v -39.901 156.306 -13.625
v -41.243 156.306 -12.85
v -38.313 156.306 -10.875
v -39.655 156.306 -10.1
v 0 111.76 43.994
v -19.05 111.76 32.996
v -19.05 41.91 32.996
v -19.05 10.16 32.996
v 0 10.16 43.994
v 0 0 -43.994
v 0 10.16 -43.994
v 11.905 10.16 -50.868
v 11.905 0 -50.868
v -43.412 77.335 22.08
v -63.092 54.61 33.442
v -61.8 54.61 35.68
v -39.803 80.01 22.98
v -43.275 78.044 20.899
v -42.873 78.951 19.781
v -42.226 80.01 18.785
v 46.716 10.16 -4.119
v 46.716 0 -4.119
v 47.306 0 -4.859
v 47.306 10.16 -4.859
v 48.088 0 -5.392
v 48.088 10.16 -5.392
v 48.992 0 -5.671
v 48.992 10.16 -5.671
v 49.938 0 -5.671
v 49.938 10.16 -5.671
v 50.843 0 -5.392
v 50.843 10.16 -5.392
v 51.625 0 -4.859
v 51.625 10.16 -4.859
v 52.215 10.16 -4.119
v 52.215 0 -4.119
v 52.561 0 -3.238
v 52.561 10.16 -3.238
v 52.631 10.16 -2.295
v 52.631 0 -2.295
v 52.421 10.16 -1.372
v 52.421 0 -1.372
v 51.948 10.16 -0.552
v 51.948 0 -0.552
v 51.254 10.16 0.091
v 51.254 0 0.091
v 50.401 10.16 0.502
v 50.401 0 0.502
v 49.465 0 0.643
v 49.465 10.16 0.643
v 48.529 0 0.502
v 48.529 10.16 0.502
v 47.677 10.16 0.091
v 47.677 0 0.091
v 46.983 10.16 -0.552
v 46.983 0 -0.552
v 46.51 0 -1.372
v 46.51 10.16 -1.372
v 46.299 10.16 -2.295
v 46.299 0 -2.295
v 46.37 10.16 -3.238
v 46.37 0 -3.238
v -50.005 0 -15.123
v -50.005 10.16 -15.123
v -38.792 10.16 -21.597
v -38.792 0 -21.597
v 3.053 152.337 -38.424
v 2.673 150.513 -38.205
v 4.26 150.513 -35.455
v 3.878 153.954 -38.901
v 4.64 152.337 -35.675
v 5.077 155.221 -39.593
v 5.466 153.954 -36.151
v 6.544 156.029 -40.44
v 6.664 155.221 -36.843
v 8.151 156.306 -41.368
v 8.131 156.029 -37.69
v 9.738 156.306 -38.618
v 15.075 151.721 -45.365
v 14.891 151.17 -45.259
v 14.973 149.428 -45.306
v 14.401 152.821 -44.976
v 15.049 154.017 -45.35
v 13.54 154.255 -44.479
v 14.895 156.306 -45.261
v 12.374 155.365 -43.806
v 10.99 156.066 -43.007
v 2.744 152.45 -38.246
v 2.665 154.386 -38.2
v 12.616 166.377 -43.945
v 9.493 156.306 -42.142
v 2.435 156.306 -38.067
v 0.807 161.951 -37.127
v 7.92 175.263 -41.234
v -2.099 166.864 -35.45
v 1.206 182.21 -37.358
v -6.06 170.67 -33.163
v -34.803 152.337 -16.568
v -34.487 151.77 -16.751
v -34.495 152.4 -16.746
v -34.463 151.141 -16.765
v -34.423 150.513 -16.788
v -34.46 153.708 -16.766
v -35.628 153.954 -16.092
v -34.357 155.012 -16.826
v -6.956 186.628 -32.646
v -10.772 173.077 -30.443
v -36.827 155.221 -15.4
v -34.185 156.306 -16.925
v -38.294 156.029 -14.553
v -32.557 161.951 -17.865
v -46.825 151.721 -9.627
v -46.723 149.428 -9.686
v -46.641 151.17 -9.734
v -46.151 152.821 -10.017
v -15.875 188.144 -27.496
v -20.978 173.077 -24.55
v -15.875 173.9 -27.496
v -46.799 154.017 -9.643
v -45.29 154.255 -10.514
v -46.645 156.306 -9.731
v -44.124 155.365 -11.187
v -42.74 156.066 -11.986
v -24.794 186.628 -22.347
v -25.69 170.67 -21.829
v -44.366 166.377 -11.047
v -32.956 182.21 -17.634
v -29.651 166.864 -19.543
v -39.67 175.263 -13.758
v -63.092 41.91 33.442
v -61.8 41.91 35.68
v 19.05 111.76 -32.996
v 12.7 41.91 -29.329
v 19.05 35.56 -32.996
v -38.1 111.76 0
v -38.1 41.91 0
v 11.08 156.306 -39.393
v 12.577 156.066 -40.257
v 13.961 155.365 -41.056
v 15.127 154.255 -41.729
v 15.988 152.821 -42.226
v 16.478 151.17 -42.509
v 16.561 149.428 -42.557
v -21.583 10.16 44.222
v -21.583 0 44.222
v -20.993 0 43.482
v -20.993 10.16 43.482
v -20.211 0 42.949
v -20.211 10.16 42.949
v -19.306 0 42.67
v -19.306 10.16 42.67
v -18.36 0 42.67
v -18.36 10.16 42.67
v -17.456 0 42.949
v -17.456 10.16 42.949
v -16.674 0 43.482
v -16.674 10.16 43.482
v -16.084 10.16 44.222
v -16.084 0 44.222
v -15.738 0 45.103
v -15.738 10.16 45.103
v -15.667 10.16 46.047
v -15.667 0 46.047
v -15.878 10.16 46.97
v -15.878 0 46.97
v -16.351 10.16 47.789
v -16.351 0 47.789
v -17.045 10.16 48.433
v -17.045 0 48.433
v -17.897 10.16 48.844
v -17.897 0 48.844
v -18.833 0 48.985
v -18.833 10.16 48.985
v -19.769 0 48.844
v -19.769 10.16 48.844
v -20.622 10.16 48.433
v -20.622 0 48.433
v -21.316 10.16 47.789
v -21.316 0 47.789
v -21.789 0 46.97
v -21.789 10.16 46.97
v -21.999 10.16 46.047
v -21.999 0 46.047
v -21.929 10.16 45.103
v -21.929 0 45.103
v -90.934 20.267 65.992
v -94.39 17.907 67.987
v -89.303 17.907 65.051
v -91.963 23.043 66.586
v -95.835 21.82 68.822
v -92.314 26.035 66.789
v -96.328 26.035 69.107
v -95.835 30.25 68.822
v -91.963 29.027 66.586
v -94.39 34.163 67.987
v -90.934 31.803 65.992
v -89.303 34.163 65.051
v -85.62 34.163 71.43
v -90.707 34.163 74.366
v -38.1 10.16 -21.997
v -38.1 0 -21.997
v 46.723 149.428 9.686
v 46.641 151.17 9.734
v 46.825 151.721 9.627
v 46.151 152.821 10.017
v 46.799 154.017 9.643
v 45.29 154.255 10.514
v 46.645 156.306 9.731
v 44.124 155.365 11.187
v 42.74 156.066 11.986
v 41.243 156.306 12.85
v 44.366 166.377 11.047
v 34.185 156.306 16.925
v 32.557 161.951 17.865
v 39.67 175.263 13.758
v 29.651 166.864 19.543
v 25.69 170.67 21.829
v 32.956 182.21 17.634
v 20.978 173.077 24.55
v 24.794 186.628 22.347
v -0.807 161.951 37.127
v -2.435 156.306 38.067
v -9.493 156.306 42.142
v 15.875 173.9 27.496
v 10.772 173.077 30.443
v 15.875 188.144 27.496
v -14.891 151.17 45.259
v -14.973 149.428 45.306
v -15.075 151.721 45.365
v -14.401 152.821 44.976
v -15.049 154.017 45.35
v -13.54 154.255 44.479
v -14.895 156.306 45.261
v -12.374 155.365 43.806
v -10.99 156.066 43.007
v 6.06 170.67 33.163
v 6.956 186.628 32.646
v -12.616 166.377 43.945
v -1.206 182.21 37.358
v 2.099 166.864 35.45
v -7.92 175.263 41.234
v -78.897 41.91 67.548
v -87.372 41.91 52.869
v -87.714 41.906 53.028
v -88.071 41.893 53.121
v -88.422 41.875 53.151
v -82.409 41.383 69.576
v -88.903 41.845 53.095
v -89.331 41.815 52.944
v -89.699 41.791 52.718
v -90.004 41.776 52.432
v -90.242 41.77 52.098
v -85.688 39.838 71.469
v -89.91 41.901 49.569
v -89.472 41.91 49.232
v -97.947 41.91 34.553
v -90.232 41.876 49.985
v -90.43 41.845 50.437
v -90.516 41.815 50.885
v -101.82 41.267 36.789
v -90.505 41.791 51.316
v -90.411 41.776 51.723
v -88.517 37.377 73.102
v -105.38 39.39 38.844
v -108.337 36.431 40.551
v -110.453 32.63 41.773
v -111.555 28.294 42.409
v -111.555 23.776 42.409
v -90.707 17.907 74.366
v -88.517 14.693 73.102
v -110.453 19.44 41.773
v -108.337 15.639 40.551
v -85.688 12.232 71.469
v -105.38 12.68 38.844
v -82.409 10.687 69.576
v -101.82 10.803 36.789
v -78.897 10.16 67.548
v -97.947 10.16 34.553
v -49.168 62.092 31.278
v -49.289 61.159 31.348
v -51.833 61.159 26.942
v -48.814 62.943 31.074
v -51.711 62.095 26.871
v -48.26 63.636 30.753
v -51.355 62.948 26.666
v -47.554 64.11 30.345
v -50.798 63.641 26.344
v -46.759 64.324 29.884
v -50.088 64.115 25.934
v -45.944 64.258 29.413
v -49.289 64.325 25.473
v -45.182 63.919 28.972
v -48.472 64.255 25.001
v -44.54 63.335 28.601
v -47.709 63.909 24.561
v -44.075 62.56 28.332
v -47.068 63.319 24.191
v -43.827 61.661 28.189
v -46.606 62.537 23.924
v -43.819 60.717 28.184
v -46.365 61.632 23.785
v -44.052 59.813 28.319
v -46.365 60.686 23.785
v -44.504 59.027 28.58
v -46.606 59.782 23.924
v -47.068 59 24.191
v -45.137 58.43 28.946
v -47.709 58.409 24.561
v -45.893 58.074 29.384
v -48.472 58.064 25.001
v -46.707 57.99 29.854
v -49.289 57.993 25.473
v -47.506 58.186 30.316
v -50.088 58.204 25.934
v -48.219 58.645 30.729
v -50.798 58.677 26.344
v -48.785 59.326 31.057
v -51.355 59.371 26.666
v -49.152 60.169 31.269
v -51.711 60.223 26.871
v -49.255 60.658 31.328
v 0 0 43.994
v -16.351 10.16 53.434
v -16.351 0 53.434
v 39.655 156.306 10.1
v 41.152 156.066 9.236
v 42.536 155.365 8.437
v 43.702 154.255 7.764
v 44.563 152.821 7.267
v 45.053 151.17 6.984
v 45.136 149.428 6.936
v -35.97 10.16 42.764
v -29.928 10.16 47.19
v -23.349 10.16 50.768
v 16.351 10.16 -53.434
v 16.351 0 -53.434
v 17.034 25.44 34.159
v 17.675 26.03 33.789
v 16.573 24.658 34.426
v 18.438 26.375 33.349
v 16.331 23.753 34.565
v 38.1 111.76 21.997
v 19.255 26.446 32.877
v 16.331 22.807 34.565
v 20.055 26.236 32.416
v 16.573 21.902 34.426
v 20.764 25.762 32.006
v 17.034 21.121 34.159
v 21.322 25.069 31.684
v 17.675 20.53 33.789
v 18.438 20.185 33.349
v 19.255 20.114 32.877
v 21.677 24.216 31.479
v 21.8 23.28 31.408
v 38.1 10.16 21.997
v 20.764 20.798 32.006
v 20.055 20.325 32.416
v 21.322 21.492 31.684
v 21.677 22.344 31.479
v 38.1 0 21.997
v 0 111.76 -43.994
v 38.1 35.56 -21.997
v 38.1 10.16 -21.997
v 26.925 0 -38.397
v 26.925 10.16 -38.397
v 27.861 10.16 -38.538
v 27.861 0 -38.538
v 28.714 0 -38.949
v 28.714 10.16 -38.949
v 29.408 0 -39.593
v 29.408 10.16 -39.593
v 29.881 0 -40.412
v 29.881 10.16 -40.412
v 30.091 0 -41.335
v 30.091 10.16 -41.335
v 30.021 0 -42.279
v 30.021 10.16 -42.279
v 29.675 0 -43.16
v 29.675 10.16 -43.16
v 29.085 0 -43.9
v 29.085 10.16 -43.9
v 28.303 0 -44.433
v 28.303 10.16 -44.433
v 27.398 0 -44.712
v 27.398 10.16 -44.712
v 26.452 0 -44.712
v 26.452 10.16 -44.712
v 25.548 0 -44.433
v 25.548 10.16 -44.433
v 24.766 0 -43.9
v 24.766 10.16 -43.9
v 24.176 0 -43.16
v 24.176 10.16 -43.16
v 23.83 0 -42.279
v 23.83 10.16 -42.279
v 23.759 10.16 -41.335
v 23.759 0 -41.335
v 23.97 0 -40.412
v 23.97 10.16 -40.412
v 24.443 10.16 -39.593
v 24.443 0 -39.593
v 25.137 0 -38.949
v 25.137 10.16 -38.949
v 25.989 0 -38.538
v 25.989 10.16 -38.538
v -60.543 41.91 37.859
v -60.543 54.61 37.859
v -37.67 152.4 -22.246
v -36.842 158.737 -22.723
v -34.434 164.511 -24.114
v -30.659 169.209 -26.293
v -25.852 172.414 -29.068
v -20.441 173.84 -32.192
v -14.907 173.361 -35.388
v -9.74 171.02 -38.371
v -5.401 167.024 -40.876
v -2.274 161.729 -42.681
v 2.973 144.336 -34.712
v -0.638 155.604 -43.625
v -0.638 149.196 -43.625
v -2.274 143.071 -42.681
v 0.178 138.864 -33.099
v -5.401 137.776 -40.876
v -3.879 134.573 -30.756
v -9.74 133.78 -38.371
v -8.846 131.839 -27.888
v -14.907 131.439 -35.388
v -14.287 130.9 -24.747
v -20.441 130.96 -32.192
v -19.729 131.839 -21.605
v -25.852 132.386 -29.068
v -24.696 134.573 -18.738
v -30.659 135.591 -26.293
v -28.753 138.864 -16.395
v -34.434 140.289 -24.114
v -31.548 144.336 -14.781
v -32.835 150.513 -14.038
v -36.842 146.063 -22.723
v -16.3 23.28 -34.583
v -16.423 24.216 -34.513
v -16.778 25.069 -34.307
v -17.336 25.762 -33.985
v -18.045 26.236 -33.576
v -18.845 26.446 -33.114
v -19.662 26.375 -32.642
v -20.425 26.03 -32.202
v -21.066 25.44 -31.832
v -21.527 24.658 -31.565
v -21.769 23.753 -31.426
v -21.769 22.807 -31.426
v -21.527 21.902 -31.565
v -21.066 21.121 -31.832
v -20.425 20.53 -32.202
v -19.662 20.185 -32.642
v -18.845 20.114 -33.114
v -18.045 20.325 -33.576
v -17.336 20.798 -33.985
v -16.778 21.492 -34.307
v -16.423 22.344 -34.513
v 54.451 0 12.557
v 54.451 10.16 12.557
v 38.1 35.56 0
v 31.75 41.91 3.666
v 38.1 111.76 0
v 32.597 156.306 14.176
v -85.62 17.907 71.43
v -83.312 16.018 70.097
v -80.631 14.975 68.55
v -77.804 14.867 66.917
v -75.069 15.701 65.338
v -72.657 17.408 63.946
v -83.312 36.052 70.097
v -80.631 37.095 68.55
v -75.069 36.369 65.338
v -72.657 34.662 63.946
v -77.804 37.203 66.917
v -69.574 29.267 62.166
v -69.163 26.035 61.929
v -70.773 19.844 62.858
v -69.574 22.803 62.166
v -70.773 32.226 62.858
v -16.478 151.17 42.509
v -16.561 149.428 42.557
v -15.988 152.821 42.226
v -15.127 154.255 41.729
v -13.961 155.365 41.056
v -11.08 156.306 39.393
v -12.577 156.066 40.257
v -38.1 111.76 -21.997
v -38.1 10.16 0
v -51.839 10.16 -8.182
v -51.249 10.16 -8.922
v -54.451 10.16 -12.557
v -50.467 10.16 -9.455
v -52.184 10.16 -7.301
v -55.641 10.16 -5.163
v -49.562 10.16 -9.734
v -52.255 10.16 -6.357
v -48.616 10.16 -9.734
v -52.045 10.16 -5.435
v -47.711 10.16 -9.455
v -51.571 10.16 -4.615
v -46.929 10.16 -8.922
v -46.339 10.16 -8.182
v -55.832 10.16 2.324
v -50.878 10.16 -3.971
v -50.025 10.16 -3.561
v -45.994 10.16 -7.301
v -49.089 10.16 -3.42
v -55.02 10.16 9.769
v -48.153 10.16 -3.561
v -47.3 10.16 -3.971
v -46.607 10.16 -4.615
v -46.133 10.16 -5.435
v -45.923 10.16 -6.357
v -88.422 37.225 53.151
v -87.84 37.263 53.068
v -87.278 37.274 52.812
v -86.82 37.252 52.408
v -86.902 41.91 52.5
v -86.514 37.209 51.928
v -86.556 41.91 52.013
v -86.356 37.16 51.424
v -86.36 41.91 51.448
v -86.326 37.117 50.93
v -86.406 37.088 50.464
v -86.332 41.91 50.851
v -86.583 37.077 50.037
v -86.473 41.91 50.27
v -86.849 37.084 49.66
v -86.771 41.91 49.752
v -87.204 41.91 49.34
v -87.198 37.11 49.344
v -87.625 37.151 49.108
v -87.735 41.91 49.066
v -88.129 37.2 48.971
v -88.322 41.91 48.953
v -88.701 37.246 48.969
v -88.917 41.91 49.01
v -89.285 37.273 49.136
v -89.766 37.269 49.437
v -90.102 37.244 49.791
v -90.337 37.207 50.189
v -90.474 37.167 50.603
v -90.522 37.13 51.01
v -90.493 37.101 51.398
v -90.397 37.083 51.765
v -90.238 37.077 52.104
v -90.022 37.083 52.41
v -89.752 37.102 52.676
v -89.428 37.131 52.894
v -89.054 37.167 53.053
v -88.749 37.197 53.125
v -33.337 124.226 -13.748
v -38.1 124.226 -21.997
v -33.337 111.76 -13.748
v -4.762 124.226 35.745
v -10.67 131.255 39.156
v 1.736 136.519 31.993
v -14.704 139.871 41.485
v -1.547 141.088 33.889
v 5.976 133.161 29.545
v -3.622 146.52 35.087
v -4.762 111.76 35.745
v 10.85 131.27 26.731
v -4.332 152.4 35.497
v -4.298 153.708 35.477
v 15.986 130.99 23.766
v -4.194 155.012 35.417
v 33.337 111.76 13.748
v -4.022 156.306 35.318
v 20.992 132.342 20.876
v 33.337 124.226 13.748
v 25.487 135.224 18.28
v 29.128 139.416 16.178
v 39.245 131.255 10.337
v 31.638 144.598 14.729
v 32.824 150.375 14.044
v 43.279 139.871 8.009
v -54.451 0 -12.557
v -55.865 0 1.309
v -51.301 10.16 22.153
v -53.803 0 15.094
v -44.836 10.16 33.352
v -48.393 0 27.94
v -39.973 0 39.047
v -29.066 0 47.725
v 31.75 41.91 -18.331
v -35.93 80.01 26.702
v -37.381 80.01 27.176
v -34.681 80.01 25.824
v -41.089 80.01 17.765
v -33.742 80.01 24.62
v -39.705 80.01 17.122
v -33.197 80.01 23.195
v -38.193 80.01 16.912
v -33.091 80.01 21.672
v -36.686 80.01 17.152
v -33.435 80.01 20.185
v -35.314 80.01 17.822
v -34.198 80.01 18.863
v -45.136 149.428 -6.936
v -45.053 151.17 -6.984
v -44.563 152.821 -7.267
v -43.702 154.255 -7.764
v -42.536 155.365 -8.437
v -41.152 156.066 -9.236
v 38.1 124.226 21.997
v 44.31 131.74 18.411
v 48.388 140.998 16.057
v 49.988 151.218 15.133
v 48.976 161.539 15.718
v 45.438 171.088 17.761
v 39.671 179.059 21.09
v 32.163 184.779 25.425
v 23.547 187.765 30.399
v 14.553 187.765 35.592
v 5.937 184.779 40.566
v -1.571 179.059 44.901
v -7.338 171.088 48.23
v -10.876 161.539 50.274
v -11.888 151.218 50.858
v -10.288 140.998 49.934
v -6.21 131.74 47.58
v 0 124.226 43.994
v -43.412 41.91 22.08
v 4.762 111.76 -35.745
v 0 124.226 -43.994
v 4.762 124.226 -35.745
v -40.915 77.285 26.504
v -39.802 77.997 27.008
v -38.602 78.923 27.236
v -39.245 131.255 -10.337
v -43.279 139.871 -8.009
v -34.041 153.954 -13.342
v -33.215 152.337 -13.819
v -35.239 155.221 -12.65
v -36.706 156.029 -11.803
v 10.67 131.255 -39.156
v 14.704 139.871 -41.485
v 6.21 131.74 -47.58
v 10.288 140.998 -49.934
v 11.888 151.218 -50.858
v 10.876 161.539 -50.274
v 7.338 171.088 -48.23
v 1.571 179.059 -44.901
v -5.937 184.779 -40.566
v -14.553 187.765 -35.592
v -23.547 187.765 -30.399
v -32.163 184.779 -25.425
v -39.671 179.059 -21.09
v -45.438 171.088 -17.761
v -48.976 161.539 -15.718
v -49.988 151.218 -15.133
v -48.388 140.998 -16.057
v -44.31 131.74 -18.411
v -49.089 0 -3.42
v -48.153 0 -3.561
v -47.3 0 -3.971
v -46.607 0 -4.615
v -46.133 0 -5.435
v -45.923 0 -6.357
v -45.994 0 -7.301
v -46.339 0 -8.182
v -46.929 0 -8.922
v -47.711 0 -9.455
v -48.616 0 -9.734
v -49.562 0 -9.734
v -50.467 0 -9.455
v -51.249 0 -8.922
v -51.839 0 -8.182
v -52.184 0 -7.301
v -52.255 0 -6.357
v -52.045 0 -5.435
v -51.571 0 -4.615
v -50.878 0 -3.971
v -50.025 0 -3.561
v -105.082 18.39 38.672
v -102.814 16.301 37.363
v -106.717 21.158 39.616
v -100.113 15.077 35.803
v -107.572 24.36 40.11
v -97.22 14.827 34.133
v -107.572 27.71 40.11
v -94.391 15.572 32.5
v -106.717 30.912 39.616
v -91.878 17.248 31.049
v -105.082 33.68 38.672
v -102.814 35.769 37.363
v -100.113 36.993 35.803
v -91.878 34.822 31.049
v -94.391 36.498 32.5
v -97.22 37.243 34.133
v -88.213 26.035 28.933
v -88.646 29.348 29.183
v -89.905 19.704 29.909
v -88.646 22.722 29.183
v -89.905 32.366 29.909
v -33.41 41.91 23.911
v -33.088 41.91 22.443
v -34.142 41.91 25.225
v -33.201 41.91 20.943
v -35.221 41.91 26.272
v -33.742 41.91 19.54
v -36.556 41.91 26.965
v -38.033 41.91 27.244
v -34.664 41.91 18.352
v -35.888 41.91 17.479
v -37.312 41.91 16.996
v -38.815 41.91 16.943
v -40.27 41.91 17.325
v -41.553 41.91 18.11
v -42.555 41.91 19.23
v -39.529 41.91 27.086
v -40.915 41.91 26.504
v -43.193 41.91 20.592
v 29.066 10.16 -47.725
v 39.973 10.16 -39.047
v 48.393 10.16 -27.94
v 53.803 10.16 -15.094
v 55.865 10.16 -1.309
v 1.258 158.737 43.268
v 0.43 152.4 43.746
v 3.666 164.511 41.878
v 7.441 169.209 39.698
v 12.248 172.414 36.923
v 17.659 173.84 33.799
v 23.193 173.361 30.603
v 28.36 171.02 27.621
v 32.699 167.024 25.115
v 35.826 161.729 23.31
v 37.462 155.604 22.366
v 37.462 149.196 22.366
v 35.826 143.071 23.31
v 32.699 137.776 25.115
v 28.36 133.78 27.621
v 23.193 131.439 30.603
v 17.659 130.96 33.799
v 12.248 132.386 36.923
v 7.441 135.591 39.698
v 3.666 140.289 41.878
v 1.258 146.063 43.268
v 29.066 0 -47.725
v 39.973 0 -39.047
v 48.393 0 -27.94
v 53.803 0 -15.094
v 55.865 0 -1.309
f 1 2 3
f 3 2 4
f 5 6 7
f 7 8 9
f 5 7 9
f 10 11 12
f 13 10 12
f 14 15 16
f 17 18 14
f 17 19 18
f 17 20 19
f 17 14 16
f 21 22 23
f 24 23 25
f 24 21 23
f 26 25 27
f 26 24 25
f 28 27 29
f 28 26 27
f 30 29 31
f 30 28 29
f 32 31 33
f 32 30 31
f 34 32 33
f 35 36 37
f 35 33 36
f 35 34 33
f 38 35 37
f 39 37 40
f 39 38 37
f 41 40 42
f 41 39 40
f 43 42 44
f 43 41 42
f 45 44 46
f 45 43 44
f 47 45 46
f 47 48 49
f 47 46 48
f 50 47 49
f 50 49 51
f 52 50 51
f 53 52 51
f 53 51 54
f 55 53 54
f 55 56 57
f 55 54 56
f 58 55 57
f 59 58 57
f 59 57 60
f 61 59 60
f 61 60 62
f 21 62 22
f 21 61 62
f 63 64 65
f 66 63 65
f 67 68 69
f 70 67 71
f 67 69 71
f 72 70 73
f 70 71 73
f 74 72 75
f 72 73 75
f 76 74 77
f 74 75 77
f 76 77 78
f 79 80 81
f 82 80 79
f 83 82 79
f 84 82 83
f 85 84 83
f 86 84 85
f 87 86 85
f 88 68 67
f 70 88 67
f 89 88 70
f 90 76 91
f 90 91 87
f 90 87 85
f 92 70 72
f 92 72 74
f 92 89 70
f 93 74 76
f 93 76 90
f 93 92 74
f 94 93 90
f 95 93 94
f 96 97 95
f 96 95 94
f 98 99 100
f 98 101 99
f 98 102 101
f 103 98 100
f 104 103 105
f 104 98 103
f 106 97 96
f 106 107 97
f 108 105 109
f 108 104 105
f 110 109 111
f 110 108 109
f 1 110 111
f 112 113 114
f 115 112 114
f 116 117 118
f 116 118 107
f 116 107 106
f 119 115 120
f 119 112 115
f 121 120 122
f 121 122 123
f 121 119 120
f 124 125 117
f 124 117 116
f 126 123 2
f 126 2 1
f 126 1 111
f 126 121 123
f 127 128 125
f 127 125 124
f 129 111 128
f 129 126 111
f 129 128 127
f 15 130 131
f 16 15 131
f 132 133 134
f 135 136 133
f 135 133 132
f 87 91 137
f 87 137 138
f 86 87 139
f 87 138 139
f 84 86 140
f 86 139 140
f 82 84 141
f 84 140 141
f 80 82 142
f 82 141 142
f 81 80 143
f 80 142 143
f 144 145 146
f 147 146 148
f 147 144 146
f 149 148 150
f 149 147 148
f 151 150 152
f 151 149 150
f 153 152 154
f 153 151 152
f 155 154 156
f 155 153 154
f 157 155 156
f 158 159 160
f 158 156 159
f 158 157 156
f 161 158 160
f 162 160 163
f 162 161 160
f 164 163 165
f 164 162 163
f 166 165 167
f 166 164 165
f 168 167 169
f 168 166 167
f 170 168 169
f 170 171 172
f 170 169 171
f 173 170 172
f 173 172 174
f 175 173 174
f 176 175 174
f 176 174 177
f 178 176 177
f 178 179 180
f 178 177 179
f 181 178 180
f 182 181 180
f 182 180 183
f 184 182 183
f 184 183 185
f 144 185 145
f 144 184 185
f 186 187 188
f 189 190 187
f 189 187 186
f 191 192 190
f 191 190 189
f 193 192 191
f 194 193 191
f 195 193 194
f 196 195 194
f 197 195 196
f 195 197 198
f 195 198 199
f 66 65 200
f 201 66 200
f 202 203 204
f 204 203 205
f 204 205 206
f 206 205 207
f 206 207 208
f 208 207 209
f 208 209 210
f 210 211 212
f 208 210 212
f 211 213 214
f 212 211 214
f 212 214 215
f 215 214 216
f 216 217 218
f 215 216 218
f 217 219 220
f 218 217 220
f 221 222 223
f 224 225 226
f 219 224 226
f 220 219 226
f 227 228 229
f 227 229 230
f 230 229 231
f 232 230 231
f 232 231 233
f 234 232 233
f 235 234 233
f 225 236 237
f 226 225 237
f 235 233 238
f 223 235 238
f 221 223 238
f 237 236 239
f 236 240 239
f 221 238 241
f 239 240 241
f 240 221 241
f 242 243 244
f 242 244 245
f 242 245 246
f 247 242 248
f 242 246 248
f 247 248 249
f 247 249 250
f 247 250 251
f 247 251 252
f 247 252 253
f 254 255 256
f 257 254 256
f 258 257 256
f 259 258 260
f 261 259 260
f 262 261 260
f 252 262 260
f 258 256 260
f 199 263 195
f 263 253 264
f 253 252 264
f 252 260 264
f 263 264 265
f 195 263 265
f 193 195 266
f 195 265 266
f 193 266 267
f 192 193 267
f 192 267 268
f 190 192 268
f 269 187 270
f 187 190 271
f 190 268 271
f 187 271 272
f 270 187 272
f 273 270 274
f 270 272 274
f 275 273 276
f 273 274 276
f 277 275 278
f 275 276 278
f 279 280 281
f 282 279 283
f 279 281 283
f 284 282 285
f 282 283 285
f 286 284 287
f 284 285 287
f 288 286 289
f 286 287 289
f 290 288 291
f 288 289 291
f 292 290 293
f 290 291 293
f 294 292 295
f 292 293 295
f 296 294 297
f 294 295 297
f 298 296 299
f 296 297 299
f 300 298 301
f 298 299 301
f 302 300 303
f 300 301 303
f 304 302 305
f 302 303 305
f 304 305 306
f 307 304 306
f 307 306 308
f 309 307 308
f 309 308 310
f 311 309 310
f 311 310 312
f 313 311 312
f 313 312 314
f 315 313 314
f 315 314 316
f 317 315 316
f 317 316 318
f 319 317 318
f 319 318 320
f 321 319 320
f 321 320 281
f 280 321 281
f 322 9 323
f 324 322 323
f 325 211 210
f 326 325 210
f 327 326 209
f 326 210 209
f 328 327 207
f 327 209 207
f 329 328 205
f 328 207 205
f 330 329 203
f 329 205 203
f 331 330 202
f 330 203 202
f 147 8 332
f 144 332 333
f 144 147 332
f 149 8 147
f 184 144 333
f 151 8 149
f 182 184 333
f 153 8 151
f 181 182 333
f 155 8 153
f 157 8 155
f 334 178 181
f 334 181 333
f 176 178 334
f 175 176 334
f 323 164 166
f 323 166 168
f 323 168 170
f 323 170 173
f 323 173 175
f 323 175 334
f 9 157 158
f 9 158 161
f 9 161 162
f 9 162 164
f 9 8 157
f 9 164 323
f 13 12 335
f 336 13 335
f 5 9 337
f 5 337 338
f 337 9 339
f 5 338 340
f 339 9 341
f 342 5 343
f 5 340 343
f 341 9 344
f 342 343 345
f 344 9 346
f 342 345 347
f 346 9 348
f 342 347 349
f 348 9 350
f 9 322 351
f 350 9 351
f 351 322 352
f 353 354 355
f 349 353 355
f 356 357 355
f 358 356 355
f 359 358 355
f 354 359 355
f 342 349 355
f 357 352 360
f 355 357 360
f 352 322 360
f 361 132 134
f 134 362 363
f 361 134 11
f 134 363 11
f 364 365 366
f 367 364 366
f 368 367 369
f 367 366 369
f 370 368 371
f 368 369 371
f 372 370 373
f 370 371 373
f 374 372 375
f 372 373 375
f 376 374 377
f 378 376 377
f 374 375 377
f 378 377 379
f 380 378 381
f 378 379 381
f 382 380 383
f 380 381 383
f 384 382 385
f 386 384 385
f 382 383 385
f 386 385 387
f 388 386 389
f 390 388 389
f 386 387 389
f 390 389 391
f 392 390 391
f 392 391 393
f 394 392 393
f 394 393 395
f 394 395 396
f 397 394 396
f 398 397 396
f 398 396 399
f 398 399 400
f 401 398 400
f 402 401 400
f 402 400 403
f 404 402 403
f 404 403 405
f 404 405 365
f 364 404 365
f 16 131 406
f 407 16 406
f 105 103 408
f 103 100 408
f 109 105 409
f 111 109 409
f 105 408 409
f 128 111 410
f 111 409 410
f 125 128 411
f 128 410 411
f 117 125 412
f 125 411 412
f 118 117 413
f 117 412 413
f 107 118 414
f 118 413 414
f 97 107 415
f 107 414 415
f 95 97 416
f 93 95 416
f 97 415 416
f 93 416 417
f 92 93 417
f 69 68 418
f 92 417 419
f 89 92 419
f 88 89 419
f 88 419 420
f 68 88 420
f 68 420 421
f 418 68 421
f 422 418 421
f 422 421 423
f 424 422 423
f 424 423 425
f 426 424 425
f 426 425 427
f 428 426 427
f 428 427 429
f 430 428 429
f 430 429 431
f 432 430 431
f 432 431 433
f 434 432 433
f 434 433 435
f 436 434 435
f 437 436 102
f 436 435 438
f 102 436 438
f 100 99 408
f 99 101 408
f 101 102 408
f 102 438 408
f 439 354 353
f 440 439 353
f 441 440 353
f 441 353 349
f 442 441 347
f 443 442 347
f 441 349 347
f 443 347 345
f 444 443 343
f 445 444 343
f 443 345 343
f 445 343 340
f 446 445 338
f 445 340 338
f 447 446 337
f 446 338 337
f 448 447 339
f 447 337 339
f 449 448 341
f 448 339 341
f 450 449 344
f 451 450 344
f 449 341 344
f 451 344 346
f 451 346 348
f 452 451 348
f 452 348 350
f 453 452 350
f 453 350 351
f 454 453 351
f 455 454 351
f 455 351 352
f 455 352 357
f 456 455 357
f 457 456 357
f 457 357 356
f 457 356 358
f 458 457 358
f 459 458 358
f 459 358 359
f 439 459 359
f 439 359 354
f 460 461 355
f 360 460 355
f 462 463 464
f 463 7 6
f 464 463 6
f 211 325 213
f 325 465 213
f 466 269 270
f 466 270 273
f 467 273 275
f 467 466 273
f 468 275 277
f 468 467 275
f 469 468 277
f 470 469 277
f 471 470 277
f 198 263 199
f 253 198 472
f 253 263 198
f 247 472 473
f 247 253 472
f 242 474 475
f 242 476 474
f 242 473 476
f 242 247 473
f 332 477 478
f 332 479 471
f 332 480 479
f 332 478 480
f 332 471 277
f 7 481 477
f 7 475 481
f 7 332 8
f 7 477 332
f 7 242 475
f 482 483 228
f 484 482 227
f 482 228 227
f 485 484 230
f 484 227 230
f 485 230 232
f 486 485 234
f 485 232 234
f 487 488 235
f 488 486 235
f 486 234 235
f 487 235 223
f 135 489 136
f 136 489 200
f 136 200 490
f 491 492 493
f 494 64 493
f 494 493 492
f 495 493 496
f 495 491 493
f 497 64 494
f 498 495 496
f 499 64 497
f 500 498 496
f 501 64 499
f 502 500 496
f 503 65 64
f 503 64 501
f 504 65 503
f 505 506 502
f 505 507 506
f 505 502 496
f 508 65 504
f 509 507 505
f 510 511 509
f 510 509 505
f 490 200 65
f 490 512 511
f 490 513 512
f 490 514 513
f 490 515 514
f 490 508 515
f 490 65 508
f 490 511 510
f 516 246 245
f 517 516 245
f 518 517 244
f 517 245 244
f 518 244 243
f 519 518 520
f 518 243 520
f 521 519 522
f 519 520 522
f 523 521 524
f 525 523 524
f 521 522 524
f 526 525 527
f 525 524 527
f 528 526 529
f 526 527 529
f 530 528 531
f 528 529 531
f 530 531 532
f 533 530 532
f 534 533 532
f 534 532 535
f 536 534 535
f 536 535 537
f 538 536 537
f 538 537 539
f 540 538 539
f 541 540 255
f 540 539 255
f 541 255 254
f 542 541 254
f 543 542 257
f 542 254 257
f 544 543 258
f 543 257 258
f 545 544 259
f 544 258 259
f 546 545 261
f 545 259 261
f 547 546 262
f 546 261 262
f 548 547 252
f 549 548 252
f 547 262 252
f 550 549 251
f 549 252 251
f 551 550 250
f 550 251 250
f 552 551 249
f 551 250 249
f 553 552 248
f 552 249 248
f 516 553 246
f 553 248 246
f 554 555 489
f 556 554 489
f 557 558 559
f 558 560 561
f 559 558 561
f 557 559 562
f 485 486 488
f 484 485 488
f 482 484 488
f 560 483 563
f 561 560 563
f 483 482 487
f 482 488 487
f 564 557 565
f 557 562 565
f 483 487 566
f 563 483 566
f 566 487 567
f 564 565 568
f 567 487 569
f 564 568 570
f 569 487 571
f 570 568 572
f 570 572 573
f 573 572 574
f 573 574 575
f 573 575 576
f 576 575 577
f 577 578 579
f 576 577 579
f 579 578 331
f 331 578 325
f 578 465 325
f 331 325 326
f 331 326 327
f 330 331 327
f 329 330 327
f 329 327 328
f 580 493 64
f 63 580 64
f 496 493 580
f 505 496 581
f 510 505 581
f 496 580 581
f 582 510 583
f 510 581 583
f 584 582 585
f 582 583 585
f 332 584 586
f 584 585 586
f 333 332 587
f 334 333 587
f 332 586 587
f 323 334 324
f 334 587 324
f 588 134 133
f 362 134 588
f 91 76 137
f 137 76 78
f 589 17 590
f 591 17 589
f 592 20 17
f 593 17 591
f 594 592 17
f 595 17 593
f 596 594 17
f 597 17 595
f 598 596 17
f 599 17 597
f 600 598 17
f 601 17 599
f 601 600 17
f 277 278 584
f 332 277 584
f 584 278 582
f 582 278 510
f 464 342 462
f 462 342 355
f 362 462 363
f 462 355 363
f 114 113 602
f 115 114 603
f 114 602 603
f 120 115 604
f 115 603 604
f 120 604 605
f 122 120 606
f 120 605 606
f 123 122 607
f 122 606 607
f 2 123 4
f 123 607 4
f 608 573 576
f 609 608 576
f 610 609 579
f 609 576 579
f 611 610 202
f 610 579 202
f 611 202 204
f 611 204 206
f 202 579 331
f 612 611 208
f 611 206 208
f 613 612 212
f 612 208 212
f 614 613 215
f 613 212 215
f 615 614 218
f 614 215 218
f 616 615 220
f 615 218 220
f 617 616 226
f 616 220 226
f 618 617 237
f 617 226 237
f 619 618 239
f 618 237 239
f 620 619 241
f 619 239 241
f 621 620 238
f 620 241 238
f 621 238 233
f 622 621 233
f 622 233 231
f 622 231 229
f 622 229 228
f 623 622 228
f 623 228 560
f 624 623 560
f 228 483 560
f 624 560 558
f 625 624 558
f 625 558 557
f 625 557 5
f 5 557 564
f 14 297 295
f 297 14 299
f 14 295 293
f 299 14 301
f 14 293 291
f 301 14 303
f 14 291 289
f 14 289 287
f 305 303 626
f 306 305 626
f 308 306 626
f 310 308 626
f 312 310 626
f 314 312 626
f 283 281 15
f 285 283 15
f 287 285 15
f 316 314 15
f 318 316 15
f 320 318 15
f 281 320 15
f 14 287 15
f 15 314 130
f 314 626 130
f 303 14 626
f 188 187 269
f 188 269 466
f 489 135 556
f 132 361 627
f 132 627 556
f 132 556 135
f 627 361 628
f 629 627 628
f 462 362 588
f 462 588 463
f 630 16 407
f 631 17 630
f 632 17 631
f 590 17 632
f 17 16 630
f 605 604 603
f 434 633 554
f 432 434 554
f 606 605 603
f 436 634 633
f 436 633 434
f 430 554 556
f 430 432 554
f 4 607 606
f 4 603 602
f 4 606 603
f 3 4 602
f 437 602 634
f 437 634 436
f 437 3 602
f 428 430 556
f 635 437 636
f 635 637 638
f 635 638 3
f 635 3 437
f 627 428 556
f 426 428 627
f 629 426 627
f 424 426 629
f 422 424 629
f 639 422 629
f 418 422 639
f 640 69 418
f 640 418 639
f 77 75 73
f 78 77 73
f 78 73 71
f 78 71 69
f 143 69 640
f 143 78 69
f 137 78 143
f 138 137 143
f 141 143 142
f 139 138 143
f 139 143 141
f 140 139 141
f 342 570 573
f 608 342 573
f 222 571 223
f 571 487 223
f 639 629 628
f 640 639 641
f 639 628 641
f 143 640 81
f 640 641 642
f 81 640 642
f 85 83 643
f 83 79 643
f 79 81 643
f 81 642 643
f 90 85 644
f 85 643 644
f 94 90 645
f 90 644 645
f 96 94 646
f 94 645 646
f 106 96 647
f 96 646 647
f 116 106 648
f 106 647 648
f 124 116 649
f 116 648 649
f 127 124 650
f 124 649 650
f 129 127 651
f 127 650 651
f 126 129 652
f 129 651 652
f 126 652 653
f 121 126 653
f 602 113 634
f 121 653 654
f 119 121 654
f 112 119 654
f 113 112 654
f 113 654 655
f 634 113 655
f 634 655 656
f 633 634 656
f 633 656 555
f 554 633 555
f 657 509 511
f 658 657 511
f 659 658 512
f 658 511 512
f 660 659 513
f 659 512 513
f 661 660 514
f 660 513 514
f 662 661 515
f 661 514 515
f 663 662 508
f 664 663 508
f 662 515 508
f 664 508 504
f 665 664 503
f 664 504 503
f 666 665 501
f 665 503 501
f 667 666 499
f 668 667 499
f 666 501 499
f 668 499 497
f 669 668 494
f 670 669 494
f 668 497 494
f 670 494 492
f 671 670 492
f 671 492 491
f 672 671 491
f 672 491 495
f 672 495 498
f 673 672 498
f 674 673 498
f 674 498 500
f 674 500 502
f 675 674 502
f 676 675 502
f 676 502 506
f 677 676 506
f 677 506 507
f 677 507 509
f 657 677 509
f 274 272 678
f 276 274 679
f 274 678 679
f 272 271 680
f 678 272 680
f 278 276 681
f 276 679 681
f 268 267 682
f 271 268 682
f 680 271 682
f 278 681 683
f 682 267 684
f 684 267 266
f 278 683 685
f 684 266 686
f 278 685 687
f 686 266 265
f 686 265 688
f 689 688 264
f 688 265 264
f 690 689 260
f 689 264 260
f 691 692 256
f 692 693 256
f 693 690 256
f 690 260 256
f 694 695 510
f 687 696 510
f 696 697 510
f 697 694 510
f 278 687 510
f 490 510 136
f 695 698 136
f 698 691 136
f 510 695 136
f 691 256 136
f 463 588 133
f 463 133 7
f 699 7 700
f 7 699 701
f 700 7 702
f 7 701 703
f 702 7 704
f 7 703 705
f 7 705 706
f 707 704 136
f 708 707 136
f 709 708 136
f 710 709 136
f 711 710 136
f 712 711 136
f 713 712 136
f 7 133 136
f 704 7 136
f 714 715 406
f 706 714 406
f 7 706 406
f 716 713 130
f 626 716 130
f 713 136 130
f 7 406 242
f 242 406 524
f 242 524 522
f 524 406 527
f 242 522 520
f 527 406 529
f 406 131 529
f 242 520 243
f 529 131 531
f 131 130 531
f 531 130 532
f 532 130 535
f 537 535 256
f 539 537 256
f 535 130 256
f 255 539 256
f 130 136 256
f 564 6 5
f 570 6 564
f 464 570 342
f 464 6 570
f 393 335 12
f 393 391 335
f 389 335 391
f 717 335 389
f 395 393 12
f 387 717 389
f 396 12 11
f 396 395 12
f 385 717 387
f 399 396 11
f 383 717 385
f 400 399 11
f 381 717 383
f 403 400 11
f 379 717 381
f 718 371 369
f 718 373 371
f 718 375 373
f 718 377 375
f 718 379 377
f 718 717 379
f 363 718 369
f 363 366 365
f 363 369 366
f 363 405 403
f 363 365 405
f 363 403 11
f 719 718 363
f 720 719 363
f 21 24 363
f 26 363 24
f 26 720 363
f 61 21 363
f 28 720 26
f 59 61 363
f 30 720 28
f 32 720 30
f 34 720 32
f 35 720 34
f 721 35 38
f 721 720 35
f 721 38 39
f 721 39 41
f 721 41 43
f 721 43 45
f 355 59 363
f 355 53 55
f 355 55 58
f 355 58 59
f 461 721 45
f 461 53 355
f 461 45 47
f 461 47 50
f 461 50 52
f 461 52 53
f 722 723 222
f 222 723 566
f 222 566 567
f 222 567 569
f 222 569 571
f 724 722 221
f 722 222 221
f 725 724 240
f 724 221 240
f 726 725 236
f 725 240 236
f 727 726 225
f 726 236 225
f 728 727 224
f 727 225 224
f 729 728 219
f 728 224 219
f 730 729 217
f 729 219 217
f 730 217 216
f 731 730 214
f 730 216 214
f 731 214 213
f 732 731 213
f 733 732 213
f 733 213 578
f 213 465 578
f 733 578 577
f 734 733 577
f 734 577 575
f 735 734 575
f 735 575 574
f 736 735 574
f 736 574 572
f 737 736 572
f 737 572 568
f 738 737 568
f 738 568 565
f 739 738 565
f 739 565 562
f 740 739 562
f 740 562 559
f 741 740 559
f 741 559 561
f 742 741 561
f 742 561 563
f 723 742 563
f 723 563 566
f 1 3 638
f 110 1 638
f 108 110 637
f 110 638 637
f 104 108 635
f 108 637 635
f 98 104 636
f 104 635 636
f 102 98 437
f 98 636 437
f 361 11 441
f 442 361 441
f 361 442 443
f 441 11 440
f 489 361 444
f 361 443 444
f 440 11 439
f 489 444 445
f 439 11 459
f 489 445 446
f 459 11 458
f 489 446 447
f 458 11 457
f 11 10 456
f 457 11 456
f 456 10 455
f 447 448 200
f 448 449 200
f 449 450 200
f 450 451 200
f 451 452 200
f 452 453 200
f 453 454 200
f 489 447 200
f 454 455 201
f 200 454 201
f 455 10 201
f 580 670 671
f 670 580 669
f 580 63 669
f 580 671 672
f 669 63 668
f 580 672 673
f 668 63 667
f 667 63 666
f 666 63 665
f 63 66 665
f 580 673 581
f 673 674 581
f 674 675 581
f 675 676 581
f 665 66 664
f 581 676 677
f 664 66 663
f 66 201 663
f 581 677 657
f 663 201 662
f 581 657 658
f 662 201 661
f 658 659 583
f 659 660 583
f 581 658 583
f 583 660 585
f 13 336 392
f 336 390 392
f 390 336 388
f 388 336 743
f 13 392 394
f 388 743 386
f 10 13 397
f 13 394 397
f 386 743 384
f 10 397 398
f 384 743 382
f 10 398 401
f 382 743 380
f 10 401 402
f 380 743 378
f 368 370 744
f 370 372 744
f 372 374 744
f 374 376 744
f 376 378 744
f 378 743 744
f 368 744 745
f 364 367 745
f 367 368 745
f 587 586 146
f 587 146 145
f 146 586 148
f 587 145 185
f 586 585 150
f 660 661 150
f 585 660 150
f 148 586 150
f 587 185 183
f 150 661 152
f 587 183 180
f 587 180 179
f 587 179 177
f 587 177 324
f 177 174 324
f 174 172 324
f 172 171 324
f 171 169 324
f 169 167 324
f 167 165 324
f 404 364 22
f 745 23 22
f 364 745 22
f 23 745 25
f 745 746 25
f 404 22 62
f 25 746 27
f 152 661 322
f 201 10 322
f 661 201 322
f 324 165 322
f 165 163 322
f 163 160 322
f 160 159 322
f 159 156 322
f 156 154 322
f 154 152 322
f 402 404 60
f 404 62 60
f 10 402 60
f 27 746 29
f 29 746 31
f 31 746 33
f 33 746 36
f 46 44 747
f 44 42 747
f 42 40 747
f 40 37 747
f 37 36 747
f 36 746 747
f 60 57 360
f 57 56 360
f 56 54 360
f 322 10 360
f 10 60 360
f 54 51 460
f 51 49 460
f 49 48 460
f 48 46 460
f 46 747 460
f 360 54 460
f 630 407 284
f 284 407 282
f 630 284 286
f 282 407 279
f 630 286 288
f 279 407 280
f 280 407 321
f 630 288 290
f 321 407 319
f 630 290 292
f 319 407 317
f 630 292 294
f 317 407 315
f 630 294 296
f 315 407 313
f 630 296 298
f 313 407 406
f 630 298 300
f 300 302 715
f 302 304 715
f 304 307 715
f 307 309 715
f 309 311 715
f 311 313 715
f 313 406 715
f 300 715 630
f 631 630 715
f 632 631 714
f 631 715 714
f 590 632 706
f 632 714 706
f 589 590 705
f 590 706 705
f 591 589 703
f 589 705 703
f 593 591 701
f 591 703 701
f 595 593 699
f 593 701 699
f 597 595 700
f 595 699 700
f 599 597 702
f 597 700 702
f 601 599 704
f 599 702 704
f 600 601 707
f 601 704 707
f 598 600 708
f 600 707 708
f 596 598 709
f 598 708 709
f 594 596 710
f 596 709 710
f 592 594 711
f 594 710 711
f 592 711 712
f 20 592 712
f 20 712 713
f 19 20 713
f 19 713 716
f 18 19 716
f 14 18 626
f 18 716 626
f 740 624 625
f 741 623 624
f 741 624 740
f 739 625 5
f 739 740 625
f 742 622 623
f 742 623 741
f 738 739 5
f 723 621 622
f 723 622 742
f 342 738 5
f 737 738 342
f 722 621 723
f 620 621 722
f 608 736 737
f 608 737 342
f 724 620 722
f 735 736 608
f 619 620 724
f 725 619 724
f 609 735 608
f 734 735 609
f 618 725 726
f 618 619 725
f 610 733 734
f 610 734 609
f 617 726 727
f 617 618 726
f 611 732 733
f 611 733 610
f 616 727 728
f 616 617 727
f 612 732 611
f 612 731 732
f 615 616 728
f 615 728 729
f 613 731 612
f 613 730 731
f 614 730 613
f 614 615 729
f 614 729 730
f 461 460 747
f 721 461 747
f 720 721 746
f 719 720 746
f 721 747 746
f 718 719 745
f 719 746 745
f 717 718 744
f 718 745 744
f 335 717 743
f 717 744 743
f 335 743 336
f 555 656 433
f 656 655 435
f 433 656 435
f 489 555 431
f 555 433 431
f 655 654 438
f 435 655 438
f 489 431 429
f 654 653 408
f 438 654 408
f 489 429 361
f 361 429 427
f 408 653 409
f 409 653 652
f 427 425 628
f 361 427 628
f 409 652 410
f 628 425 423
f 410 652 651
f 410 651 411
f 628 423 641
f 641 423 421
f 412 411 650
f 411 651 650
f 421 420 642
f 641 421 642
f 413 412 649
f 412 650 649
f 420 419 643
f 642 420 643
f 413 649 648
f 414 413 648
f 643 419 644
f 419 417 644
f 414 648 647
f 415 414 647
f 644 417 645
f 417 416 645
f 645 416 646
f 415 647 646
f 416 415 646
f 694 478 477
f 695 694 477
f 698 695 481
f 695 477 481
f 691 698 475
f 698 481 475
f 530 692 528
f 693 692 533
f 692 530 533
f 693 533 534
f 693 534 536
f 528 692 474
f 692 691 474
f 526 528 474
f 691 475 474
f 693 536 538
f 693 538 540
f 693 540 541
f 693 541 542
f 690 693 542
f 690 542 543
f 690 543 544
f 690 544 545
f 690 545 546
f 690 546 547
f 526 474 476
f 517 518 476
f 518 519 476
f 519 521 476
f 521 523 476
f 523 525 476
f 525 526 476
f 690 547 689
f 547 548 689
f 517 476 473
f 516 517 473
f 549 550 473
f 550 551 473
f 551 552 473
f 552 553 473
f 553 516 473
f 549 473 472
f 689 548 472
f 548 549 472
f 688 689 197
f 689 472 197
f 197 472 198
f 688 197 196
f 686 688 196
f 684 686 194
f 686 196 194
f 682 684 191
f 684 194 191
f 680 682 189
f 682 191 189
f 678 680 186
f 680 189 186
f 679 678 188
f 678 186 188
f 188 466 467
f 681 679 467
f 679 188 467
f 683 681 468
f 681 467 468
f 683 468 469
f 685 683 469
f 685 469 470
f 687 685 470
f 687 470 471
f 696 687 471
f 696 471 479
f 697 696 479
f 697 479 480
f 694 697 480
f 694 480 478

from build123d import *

# Parameters (mm, degrees)
SKETCH4_R            = 55.88
BOSS_EXTRUDE2_DEPTH  = 10.16
BOSS_EXTRUDE4_DEPTH  = 101.6
BOSS_EXTRUDE5_DEPTH  = 9.525
BOSS_EXTRUDE6_START  = -9.525
BOSS_EXTRUDE6_DEPTH  = 9.525
CUT_EXTRUDE4_REACH   = 223.16
SKETCH12_R           = 21.5
SKETCH13_W           = 38.1
SKETCH13_H           = 69.85
CUT_EXTRUDE5_DEPTH   = 76.2
BOSS_EXTRUDE10_DEPTH = 19.05
SKETCH28_R           = 11.2395
CUT_EXTRUDE9_DEPTH   = 38.1
CUT_EXTRUDE10_DEPTH  = 7.366
CHAMFER1_SIZE        = 6.35
SKETCH30_R           = 2.1
CUT_EXTRUDE11_DEPTH  = 7.366
SKETCH31_R           = 3.175
CUT_EXTRUDE12_DEPTH  = 223.900333216
BOSS_EXTRUDE11_DEPTH = 38.1
CHAMFER2_SIZE        = 25.4
CUT_EXTRUDE13_REACH  = 233.204
SKETCH34_R           = 3.175
SKETCH35_R           = 3.175
CUT_EXTRUDE14_DEPTH  = 246.746626534
SKETCH36_W           = 63.5
SKETCH36_H           = 36.709955102
CUT_EXTRUDE15_DEPTH  = 63.5
FILLET1_R            = 6.35
CUT_EXTRUDE16_DEPTH  = 223.900333216


with BuildPart() as part:
    # Sketch4 → Boss-Extrude2 (new body)
    with BuildSketch(Plane(origin=(0, 0, 0), x_dir=(1, 0, 0), z_dir=(0, 1, 0))):
        with Locations(Location((0, 0, 0), (0, 0, 270))):
            Circle(SKETCH4_R)
    extrude(amount=BOSS_EXTRUDE2_DEPTH)

    # Sketch8 → Boss-Extrude4 (add)
    with BuildSketch(Plane(origin=(0, 10.16, 0), x_dir=(1, 0, 0), z_dir=(0, 1, 0))):
        Polygon((0, 43.994090512), (-38.1, 21.997045256), (-38.1, -21.997045256), (0, -43.994090512), (38.1, -21.997045256), (38.1, 21.997045256), align=None)
    extrude(amount=BOSS_EXTRUDE4_DEPTH)

    # Sketch9 → Boss-Extrude5 (add)
    with BuildSketch(Plane(origin=(-19.05, 0, -32.995567884), x_dir=(-0.8660254037844386, 0, 0.5000000000000003), z_dir=(-0.5000000000000002, 0, -0.8660254037844385))):
        with BuildLine():
            Line((21.997045256, 111.76), (-21.997045256, 111.76))
            Line((-21.997045256, 111.76), (-21.997045256, 124.225996336))
            ThreePointArc((-21.997045256, 124.225996336), (0, 188.144153123), (21.997045256, 124.225996336))
            Line((21.997045256, 124.225996336), (21.997045256, 111.76))
        make_face()
    extrude(amount=-BOSS_EXTRUDE5_DEPTH)

    # Sketch10 → Boss-Extrude6 (add)
    with BuildSketch(Plane(origin=(19.05, 0, 32.995567884), x_dir=(0.8660254037844386, 0, -0.5000000000000001), z_dir=(0.5000000000000001, 0, 0.8660254037844386)).offset(BOSS_EXTRUDE6_START)):
        with BuildLine():
            Line((-21.997045256, 111.76), (21.997045256, 111.76))
            Line((21.997045256, 111.76), (21.997045256, 124.225996336))
            ThreePointArc((21.997045256, 124.225996336), (0, 188.144153123), (-21.997045256, 124.225996336))
            Line((-21.997045256, 124.225996336), (-21.997045256, 111.76))
        make_face()
    extrude(amount=BOSS_EXTRUDE6_DEPTH)

    # Cut-Extrude4: up to this face of the body (flat: up to its plane)
    cut_extrude4_end = Plane(part.part.faces().sort_by_distance((19.05, 104.643172711, 32.995567884))[0])
    # Sketch12 → Cut-Extrude4 (cut, up to the picked face)
    with BuildSketch(Plane(origin=(-19.05, 0, -32.995567884), x_dir=(-0.8660254037844386, 0, 0.5000000000000003), z_dir=(-0.5000000000000002, 0, -0.8660254037844385)), mode=Mode.PRIVATE) as cut_extrude4_sk1:
        with Locations((0, 152.4)):
            Circle(SKETCH12_R)
    cut_extrude4_tool1 = split(extrude(cut_extrude4_sk1.sketch, amount=-CUT_EXTRUDE4_REACH, mode=Mode.PRIVATE), bisect_by=cut_extrude4_end, keep=Keep.BOTH, mode=Mode.PRIVATE)
    add(cut_extrude4_tool1.solids().sort_by(Axis((-19.05, 152.4, -32.995568), (0.5000000000000002, 0, 0.8660254037844385)))[0], mode=Mode.SUBTRACT)

    # Sketch13 → Cut-Extrude5 (cut, symmetric)
    with BuildSketch(Plane(origin=(-19.05, 0, 10.998522628), x_dir=(0.5000000000000002, 0, 0.8660254037844386), z_dir=(-0.8660254037844385, 0, 0.5000000000000001))):
        with Locations((0, 76.835)):
            Rectangle(SKETCH13_W, SKETCH13_H)
    extrude(amount=CUT_EXTRUDE5_DEPTH, both=True, mode=Mode.SUBTRACT)

    # Sketch22 → Boss-Extrude10 (add, symmetric)
    with BuildSketch(Plane(origin=(0, 0, 0), x_dir=(-0.8660254037844386, 0, 0.5000000000000001), z_dir=(-0.5000000000000001, 0, -0.8660254037844386))):
        with BuildLine():
            Line((43.994090512, 41.91), (102.10102108, 41.91))
            ThreePointArc((102.10102108, 41.91), (117.97602108, 26.035), (102.10102108, 10.16))
            Line((102.10102108, 10.16), (43.994090512, 10.16))
            Line((43.994090512, 10.16), (21.997045256, 10.16))
            Line((21.997045256, 10.16), (21.997045256, 41.91))
            Line((21.997045256, 41.91), (43.994090512, 41.91))
        make_face()
    extrude(amount=BOSS_EXTRUDE10_DEPTH, both=True)

    # Sketch28 → Cut-Extrude9 (cut)
    with BuildSketch(Plane(origin=(9.525, 0, 16.497783942), x_dir=(0.8660254037844386, 0, -0.5000000000000001), z_dir=(0.5000000000000001, 0, 0.8660254037844386))):
        with Locations((-102.10102108, 26.035)):
            Circle(SKETCH28_R)
    extrude(amount=-CUT_EXTRUDE9_DEPTH, mode=Mode.SUBTRACT)

    # Sketch29 → Cut-Extrude10 (cut)
    with BuildSketch(Plane(origin=(9.525, 0, 16.497783942), x_dir=(0.8660254037844386, 0, -0.5000000000000001), z_dir=(0.5000000000000001, 0, 0.8660254037844386))):
        with BuildLine():
            Line((-115.737415068, 17.907), (-109.863879848, 17.907))
            ThreePointArc((-109.863879848, 17.907), (-113.34052108, 26.035), (-109.863879848, 34.163))
            Line((-109.863879848, 34.163), (-115.737415068, 34.163))
            ThreePointArc((-115.737415068, 34.163), (-117.97602108, 26.035), (-115.737415068, 17.907))
        make_face()
    extrude(amount=-CUT_EXTRUDE10_DEPTH, mode=Mode.SUBTRACT)

    # Chamfer1
    chamfer1_edges = [part.edges().sort_by_distance(p)[0] for p in [
        (38.1, 41.91, -10.998522628),
        (28.575, 41.91, -27.49630657),
    ]]
    chamfer(chamfer1_edges, length=CHAMFER1_SIZE)

    # Sketch30 → Cut-Extrude11 (cut)
    with BuildSketch(Plane(origin=(0, 41.91, 0), x_dir=(1, 0, 0), z_dir=(0, 1, 0))):
        with Locations(Location((-88.422078008, -51.05051054, 0), (0, 0, 270))):
            Circle(SKETCH30_R)
    extrude(amount=-CUT_EXTRUDE11_DEPTH, mode=Mode.SUBTRACT)

    # Sketch31 → Cut-Extrude12 (cut, through all)
    with BuildSketch(Plane(origin=(0, 10.16, 0), x_dir=(1, 0, 0), z_dir=(0, 1, 0))):
        with Locations(Location((-49.089000823, 6.594762938, 0), (0, 0, 270))):
            Circle(SKETCH31_R)
        with Locations(Location((26.925278647, 41.57222955, 0), (0, 0, 270))):
            Circle(SKETCH31_R)
    cut_extrude12 = extrude(amount=-CUT_EXTRUDE12_DEPTH, mode=Mode.SUBTRACT)

    # Mirror1: Cut-Extrude12 across plane
    add(cut_extrude12.mirror(Plane(origin=(0, 0, 0), x_dir=(-0.8660254037844386, 0, 0.5000000000000001), z_dir=(-0.5000000000000001, 0, -0.8660254037844386))), mode=Mode.SUBTRACT)

    # Sketch33 → Boss-Extrude11 (add)
    with BuildSketch(Plane(origin=(0, 41.91, 0), x_dir=(1, 0, 0), z_dir=(0, 1, 0))):
        with BuildLine():
            Line((-43.411916389, -22.079834386), (-63.092428819, -33.442383535))
            Line((-63.092428819, -33.442383535), (-61.800298466, -35.680418955))
            Line((-61.800298466, -35.680418955), (-60.542722832, -37.858603849))
            Line((-60.542722832, -37.858603849), (-40.91541904, -26.504074545))
            ThreePointArc((-40.91541904, -26.504074545), (-33.742060338, -19.539834386), (-43.411916389, -22.079834386))
        make_face()
    extrude(amount=BOSS_EXTRUDE11_DEPTH)

    # Chamfer2
    chamfer2_edges = [part.edges().sort_by_distance(p)[0] for p in [
        (-61.817575825, 80.01, 35.650493692),
    ]]
    chamfer(chamfer2_edges, length=CHAMFER2_SIZE)

    # Cut-Extrude13: up to this plane
    cut_extrude13_end = Plane(origin=(-60.542722832, 80.01, 37.858603849), z_dir=(-0.500750644235671, 0, -0.8655915851587056))
    # Sketch34 → Cut-Extrude13 (cut, up to the surface)
    with BuildSketch(Plane(origin=(-1.292130352, 0, -2.23803542), x_dir=(-0.8660254037844386, 0, 0.5000000000000003), z_dir=(-0.5000000000000002, 0, -0.8660254037844385)), mode=Mode.PRIVATE) as cut_extrude13_sk1:
        with Locations((55.184849848, 61.159110234)):
            Circle(SKETCH34_R)
    cut_extrude13_tool1 = split(extrude(cut_extrude13_sk1.sketch, amount=-CUT_EXTRUDE13_REACH, mode=Mode.PRIVATE), bisect_by=cut_extrude13_end, keep=Keep.BOTH, mode=Mode.PRIVATE)
    add(cut_extrude13_tool1.solids().sort_by_distance((-49.083612, 61.15911, 25.35439))[0], mode=Mode.SUBTRACT)

    # Sketch35 → Cut-Extrude14 (cut, through all)
    with BuildSketch(Plane(origin=(19.05, 0, 32.995567884), x_dir=(0.8660254037844386, 0, -0.5000000000000001), z_dir=(0.5000000000000001, 0, 0.8660254037844386))):
        with Locations((0, 23.280078313)):
            Circle(SKETCH35_R)
    extrude(amount=-CUT_EXTRUDE14_DEPTH, mode=Mode.SUBTRACT)

    # Sketch36 → Cut-Extrude15 (cut, symmetric)
    with BuildSketch(Plane(origin=(-19.05, 0, 10.998522628), x_dir=(0.5000000000000004, 0, 0.8660254037844384), z_dir=(-0.8660254037844384, 0, 0.5000000000000004))):
        with Locations((0, 174.660846527)):
            Rectangle(SKETCH36_W, SKETCH36_H)
    extrude(amount=CUT_EXTRUDE15_DEPTH, both=True, mode=Mode.SUBTRACT)

    # Fillet1
    # the kernel refuses this fillet: 6.35 mm, written as the material it takes off along each edge
    with BuildSketch(Plane(origin=(12.272597523, 156.305868976, -21.027711652), x_dir=(0.04103819462533737, -0.9988766133891899, -0.023693412713994805), z_dir=(-0.5000000000000003, 0, -0.8660254037844386))) as fillet1_piece_1:
        with BuildLine():
            CenterArc((6.655634068, -6.291985478), FILLET1_R, 97.750867839, 84.965214409)
            Line((0.312767573, -6.592891819), (0, 0))
            ThreePointArc((0, 0), (2.899617679, -0.196427123), (5.799235358, 0))
        make_face()
    extrude(amount=19.675766287, mode=Mode.SUBTRACT)
    with BuildSketch(Plane(origin=(-24.346831236, 156.305868976, 0.114525399), x_dir=(-0.04103819462533767, -0.9988766133891899, 0.023693412713994975), z_dir=(-0.5000000000000003, 0, -0.8660254037844386))) as fillet1_piece_2:
        with BuildLine():
            CenterArc((6.655634068, 6.291985478), FILLET1_R, 177.283917752, 84.965214409)
            Line((0.312767573, 6.592891819), (0, 0))
            ThreePointArc((0, 0), (2.899617679, 0.196427123), (5.799235358, 0))
        make_face()
    extrude(amount=19.675766287, mode=Mode.SUBTRACT)
    with BuildSketch(Plane(origin=(-14.894977291, 156.305868976, 45.261361242), x_dir=(-0.011364190914464473, -0.999913899736612, 0.0065611186835884), z_dir=(-0.5000000000000002, 0, -0.8660254037844386)), Plane(origin=(-36.459231913, 156.305868976, 7.91097661), x_dir=(-0.011364190914463116, -0.999913899736612, 0.0065611186835876165), z_dir=(-0.5000000000000002, 0, -0.8660254037844386))) as fillet1_piece_3:
        with BuildLine():
            CenterArc((6.26760006, -6.320536654), FILLET1_R, 84.478464497, 94.769665105)
            Line((-0.081853204, -6.237210446), (0, 0))
            ThreePointArc((0, 0), (3.439298151, 0.165849191), (6.878596303, 0))
        make_face()
    extrude(amount=20.371490756, mode=Mode.SUBTRACT)
    with BuildSketch(Plane(origin=(25.080722669, 156.305868976, -27.619132734), x_dir=(0.011364190914465366, -0.999913899736612, -0.00656111868358885), z_dir=(-0.5000000000000002, 0, -0.8660254037844386)), Plane(origin=(46.644977291, 156.305868976, 9.731251898), x_dir=(0.011364190914466365, -0.999913899736612, -0.006561118683589426), z_dir=(-0.5000000000000002, 0, -0.8660254037844386))) as fillet1_piece_4:
        with BuildLine():
            CenterArc((6.26760006, 6.320536654), FILLET1_R, 180.751870398, 94.769665105)
            Line((-0.081853204, 6.237210446), (0, 0))
            ThreePointArc((0, 0), (3.439298151, -0.165849191), (6.878596303, 0))
        make_face()
    extrude(amount=20.371490756, mode=Mode.SUBTRACT)

    # Sketch37 → Cut-Extrude16 (cut, through all)
    with BuildSketch(Plane(origin=(0, 10.16, 0), x_dir=(1, 0, 0), z_dir=(0, 1, 0))):
        with BuildLine():
            Line((-72.24200472, 2.28514964), (-54.450894057, 12.556852171))
            ThreePointArc((-54.450894057, 12.556852171), (-27.94, 48.393499563), (16.350894057, 53.434283597))
            Line((16.350894057, 53.434283597), (28.91906675, 60.690521485))
            Line((28.91906675, 60.690521485), (-19.05, 57.412021454))
            Line((-19.05, 57.412021454), (-73.371024583, 21.597251022))
            Line((-73.371024583, 21.597251022), (-72.24200472, 5.078102435))
            Line((-72.24200472, 5.078102435), (-72.24200472, 2.28514964))
        make_face()
        with BuildLine():
            Line((-54.450894057, 12.556852171), (-50.005344641, 15.123491323))
            Line((-50.005344641, 15.123491323), (-38.792463926, 21.597251022))
            Line((-38.792463926, 21.597251022), (-38.1, 21.997045256))
            Line((-38.1, 21.997045256), (0, 43.994090512))
            Line((0, 43.994090512), (11.905344641, 50.867644445))
            Line((11.905344641, 50.867644445), (16.350894057, 53.434283597))
            ThreePointArc((16.350894057, 53.434283597), (-27.94, 48.393499563), (-54.450894057, 12.556852171))
        make_face()
        with BuildLine():
            ThreePointArc((-16.350894057, -53.434283597), (27.94, -48.393499563), (54.450894057, -12.556852171))
            Line((54.450894057, -12.556852171), (38.1, -21.997045256))
            Line((38.1, -21.997045256), (19.05, -32.995567884))
            Line((19.05, -32.995567884), (0, -43.994090512))
            Line((0, -43.994090512), (-16.350894057, -53.434283597))
        make_face()
        with BuildLine():
            Line((63.673498956, -7.232178749), (54.450894057, -12.556852171))
            ThreePointArc((54.450894057, -12.556852171), (27.94, -48.393499563), (-16.350894057, -53.434283597))
            Line((-16.350894057, -53.434283597), (-27.007271943, -59.586746239))
            Line((-27.007271943, -59.586746239), (28.91906675, -77.707339719))
            Line((28.91906675, -77.707339719), (77.1233643, -25.432245504))
            Line((77.1233643, -25.432245504), (71.516001253, -6.077798857))
            Line((71.516001253, -6.077798857), (63.673498956, -7.232178749))
        make_face()
    extrude(amount=-CUT_EXTRUDE16_DEPTH, mode=Mode.SUBTRACT)


solid = part.part
